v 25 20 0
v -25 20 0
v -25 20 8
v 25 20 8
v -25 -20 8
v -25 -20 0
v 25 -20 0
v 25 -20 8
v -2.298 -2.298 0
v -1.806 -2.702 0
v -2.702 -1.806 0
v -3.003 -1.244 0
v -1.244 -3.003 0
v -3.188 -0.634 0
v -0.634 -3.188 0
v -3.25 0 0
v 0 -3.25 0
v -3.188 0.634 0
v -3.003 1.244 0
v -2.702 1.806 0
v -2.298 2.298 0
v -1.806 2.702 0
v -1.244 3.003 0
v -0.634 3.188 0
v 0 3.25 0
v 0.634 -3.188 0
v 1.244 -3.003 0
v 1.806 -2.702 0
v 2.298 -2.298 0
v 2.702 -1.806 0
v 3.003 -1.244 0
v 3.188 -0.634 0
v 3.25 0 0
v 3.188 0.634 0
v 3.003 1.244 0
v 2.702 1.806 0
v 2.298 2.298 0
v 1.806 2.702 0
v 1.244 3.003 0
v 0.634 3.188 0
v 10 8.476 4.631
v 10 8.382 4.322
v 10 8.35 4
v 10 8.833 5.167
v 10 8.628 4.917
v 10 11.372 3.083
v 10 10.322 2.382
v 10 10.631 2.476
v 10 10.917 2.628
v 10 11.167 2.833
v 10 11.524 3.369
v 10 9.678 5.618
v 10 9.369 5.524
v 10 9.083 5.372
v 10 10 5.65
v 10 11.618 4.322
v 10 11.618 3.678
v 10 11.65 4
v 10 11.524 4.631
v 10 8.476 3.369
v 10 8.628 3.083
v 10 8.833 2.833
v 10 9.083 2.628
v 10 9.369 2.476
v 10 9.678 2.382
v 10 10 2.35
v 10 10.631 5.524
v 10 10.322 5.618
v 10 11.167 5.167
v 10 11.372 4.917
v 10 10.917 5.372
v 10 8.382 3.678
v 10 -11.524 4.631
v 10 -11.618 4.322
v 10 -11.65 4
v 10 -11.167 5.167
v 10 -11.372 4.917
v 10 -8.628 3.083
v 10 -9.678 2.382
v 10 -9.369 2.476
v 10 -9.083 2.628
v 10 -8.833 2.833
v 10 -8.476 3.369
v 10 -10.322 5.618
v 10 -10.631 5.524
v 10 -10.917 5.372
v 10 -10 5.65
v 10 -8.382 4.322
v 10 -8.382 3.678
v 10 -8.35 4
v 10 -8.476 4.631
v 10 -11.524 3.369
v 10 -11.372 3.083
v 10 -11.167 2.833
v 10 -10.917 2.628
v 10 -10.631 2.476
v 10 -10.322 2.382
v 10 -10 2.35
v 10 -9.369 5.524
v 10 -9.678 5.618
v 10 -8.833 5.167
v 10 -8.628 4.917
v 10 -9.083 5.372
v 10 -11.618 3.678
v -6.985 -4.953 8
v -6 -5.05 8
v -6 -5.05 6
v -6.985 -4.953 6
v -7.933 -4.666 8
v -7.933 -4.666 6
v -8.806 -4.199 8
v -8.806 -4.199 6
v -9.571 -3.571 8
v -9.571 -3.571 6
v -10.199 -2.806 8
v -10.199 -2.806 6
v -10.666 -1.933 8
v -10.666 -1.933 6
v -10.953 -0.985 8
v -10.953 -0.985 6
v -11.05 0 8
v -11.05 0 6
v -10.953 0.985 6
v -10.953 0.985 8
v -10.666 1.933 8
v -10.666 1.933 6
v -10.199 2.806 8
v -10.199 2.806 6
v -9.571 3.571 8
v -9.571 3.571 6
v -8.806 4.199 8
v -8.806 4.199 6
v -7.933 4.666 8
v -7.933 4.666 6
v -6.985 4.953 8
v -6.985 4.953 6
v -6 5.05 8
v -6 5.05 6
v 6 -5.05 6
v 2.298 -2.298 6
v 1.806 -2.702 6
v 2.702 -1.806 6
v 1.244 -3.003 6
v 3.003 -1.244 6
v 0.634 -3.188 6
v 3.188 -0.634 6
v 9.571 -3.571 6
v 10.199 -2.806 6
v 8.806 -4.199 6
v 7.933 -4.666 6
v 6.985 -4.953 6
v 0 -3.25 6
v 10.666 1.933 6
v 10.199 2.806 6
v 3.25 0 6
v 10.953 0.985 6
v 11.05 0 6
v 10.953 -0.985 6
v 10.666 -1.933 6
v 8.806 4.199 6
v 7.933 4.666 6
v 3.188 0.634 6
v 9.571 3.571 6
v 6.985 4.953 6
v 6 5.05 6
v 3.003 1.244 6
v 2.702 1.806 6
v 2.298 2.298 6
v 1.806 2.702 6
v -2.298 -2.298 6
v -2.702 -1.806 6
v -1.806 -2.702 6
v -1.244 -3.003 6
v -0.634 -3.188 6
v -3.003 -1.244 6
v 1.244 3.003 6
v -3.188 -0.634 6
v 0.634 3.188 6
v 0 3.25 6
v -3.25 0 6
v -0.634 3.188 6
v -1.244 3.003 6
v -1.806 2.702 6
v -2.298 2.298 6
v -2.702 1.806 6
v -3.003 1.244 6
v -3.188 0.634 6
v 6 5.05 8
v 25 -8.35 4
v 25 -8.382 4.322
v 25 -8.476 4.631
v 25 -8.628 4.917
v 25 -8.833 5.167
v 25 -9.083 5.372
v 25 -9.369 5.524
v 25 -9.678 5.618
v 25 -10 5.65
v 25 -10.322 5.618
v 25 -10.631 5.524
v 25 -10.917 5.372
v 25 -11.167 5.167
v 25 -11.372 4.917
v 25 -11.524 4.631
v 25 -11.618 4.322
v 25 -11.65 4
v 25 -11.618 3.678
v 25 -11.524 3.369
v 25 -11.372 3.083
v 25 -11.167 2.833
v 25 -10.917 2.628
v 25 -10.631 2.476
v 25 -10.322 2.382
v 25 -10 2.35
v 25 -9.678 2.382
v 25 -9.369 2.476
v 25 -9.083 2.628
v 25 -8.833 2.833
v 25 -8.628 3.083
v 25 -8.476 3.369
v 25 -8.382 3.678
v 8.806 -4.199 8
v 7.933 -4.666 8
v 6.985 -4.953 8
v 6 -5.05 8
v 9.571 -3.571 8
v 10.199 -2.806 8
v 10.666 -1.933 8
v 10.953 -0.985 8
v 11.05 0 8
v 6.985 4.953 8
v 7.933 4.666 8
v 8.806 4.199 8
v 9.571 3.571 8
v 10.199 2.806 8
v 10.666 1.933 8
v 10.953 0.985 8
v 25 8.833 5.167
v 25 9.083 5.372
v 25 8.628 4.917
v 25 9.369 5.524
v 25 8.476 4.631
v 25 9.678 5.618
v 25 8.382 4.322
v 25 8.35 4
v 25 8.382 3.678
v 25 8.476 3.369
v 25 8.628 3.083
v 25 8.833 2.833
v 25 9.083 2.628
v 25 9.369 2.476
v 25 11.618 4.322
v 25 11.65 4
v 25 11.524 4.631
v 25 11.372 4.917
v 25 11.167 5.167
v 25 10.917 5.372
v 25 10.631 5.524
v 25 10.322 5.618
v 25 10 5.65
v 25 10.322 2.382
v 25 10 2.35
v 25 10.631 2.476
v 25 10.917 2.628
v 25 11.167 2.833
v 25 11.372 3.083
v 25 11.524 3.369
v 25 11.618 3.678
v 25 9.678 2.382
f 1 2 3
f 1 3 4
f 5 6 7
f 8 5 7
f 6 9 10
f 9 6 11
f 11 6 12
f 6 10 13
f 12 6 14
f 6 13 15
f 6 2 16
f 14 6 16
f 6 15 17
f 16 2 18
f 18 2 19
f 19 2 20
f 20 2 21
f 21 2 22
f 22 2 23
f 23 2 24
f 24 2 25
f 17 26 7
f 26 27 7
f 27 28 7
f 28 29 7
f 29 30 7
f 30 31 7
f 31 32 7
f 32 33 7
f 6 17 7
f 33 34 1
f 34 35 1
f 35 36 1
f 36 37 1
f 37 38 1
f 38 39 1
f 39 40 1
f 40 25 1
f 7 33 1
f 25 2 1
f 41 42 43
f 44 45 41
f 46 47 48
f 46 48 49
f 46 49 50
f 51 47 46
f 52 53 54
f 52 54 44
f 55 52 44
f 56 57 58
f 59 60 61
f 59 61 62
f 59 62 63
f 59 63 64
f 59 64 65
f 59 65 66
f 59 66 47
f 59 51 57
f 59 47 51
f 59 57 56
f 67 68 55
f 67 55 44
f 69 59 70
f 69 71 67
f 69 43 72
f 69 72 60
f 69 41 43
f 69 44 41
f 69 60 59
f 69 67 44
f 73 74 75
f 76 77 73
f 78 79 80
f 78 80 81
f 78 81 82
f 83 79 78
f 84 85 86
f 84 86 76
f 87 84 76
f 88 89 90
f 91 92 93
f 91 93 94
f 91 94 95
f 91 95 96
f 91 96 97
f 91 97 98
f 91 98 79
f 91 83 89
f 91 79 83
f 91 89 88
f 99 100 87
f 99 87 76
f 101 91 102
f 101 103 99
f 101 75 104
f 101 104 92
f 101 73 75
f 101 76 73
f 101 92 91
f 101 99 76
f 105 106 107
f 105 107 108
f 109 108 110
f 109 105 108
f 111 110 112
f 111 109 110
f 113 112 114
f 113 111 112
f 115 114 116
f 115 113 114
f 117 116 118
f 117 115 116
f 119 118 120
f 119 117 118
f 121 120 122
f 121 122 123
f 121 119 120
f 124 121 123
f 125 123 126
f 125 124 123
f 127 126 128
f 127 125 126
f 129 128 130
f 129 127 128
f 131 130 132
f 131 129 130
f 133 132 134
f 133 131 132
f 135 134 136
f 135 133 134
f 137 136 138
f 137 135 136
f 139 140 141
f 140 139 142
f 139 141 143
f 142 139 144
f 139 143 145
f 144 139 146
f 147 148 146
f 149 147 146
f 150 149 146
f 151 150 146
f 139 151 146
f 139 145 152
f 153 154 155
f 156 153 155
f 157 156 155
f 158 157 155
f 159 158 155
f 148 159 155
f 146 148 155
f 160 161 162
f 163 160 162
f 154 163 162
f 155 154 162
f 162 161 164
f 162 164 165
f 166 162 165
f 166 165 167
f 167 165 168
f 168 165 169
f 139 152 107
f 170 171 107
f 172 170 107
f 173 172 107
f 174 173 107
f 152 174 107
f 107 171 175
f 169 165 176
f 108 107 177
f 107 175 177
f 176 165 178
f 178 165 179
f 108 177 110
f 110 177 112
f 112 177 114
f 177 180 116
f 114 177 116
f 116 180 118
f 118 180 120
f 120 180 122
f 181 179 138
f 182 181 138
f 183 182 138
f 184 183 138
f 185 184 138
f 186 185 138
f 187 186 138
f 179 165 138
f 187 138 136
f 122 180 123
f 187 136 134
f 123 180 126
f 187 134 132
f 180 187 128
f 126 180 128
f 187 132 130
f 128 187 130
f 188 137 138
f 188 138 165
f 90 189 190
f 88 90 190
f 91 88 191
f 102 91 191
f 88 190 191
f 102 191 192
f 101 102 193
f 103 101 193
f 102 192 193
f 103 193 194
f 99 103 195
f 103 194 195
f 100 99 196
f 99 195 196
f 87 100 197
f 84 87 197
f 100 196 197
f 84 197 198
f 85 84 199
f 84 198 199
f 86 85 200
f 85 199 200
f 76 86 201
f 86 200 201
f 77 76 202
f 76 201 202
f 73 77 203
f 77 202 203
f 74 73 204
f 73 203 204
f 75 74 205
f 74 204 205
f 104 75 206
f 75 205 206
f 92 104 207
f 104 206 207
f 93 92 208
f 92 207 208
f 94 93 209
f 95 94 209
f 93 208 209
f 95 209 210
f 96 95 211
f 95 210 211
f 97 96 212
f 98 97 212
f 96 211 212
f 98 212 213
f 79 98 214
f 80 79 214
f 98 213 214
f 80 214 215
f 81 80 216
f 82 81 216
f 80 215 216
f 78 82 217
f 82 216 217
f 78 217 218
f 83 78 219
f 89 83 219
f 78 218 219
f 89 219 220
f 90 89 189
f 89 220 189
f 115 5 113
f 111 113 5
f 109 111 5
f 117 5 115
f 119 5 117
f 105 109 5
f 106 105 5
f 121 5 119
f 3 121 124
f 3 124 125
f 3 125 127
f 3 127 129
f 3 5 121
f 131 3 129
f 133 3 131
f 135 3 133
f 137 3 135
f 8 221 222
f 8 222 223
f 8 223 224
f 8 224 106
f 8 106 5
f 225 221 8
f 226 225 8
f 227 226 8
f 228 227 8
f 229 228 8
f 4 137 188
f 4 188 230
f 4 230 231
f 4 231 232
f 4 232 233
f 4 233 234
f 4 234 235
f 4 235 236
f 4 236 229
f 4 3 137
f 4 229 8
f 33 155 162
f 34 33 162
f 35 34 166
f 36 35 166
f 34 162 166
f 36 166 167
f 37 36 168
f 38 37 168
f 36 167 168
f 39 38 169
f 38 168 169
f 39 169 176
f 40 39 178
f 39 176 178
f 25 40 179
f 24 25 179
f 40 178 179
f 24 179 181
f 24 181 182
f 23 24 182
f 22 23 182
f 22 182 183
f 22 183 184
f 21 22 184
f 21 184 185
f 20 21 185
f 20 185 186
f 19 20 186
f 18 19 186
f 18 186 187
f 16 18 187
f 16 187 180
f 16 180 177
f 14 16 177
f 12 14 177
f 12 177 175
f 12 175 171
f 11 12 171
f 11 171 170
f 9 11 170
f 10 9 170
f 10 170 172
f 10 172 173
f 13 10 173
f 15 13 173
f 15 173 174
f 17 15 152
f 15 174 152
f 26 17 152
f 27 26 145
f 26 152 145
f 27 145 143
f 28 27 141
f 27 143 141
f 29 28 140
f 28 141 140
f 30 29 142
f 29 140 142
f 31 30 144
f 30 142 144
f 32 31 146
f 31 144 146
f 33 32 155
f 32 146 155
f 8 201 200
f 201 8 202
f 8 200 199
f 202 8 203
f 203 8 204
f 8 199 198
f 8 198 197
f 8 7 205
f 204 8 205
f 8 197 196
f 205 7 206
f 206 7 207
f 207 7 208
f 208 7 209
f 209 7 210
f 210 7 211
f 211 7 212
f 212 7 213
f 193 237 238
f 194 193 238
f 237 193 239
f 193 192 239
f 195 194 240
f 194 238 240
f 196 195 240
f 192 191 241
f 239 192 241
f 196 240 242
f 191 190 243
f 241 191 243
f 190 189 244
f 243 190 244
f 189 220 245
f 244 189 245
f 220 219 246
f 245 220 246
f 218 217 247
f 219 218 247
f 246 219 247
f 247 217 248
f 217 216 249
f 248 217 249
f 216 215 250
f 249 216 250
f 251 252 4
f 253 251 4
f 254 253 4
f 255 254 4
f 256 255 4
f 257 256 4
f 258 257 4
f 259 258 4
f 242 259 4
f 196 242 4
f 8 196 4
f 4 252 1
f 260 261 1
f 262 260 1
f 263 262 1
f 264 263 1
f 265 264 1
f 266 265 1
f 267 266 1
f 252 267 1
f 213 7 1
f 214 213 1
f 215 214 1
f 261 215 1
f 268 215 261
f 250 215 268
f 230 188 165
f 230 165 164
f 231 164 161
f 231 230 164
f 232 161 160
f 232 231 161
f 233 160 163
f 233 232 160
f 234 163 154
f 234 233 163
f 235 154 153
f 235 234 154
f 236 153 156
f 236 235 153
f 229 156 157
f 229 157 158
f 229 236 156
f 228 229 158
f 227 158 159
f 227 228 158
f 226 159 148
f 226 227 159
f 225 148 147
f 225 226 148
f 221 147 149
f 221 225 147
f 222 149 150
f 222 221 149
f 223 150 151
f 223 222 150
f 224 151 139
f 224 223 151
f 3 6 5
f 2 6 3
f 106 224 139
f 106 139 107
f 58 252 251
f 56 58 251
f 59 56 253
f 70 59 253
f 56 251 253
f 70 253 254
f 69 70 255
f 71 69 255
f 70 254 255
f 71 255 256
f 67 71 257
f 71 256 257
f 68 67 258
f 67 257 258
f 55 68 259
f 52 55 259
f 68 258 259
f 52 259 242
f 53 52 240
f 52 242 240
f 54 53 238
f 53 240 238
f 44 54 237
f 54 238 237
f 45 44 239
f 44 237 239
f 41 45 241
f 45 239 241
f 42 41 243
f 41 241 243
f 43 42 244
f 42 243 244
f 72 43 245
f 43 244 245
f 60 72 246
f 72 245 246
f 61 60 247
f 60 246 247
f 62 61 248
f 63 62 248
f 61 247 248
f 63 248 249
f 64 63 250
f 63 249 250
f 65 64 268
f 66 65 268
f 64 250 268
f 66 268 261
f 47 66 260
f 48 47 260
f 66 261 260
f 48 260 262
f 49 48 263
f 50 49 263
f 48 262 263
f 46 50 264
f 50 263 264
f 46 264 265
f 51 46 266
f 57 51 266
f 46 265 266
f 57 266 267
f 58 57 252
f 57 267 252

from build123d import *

# Parameters (mm, degrees)
SKETCH_1_W          = 50
SKETCH_1_H          = 40
EXTRUDE_1_DEPTH     = 8
CUT_EXTRUDE_1_DEPTH = 2
SKETCH_3_R          = 3.25
CUT_EXTRUDE_2_DEPTH = 10
SKETCH_4_R          = 1.65
CUT_EXTRUDE_3_DEPTH = 15


with BuildPart() as part:
    # Эскиз1 → Бобышка-Вытянуть1 (new body)
    with BuildSketch(Plane.XY):
        Rectangle(SKETCH_1_W, SKETCH_1_H)
    extrude(amount=EXTRUDE_1_DEPTH)

    # Эскиз2 → Вырез-Вытянуть1 (cut)
    with BuildSketch(Plane.XY.offset(8)):
        with BuildLine():
            Line((-6, 5.05), (6, 5.05))
            ThreePointArc((6, 5.05), (11.05, 0), (6, -5.05))
            Line((6, -5.05), (-6, -5.05))
            ThreePointArc((-6, -5.05), (-11.05, 0), (-6, 5.05))
        make_face()
    extrude(amount=-CUT_EXTRUDE_1_DEPTH, mode=Mode.SUBTRACT)

    # Эскиз3 → Вырез-Вытянуть2 (cut)
    with BuildSketch(Plane.XY.offset(6)):
        Circle(SKETCH_3_R)
    extrude(amount=-CUT_EXTRUDE_2_DEPTH, mode=Mode.SUBTRACT)

    # Эскиз4 → Вырез-Вытянуть3 (cut)
    with BuildSketch(Plane(origin=(25, 0, 0), x_dir=(0, 0, -1), z_dir=(1, 0, 0))):
        with Locations(Location((-4, -10, 0), (0, 0, 90))):
            Circle(SKETCH_4_R)
        with Locations(Location((-4, 10, 0), (0, 0, 90))):
            Circle(SKETCH_4_R)
    extrude(amount=-CUT_EXTRUDE_3_DEPTH, mode=Mode.SUBTRACT)


solid = part.part
